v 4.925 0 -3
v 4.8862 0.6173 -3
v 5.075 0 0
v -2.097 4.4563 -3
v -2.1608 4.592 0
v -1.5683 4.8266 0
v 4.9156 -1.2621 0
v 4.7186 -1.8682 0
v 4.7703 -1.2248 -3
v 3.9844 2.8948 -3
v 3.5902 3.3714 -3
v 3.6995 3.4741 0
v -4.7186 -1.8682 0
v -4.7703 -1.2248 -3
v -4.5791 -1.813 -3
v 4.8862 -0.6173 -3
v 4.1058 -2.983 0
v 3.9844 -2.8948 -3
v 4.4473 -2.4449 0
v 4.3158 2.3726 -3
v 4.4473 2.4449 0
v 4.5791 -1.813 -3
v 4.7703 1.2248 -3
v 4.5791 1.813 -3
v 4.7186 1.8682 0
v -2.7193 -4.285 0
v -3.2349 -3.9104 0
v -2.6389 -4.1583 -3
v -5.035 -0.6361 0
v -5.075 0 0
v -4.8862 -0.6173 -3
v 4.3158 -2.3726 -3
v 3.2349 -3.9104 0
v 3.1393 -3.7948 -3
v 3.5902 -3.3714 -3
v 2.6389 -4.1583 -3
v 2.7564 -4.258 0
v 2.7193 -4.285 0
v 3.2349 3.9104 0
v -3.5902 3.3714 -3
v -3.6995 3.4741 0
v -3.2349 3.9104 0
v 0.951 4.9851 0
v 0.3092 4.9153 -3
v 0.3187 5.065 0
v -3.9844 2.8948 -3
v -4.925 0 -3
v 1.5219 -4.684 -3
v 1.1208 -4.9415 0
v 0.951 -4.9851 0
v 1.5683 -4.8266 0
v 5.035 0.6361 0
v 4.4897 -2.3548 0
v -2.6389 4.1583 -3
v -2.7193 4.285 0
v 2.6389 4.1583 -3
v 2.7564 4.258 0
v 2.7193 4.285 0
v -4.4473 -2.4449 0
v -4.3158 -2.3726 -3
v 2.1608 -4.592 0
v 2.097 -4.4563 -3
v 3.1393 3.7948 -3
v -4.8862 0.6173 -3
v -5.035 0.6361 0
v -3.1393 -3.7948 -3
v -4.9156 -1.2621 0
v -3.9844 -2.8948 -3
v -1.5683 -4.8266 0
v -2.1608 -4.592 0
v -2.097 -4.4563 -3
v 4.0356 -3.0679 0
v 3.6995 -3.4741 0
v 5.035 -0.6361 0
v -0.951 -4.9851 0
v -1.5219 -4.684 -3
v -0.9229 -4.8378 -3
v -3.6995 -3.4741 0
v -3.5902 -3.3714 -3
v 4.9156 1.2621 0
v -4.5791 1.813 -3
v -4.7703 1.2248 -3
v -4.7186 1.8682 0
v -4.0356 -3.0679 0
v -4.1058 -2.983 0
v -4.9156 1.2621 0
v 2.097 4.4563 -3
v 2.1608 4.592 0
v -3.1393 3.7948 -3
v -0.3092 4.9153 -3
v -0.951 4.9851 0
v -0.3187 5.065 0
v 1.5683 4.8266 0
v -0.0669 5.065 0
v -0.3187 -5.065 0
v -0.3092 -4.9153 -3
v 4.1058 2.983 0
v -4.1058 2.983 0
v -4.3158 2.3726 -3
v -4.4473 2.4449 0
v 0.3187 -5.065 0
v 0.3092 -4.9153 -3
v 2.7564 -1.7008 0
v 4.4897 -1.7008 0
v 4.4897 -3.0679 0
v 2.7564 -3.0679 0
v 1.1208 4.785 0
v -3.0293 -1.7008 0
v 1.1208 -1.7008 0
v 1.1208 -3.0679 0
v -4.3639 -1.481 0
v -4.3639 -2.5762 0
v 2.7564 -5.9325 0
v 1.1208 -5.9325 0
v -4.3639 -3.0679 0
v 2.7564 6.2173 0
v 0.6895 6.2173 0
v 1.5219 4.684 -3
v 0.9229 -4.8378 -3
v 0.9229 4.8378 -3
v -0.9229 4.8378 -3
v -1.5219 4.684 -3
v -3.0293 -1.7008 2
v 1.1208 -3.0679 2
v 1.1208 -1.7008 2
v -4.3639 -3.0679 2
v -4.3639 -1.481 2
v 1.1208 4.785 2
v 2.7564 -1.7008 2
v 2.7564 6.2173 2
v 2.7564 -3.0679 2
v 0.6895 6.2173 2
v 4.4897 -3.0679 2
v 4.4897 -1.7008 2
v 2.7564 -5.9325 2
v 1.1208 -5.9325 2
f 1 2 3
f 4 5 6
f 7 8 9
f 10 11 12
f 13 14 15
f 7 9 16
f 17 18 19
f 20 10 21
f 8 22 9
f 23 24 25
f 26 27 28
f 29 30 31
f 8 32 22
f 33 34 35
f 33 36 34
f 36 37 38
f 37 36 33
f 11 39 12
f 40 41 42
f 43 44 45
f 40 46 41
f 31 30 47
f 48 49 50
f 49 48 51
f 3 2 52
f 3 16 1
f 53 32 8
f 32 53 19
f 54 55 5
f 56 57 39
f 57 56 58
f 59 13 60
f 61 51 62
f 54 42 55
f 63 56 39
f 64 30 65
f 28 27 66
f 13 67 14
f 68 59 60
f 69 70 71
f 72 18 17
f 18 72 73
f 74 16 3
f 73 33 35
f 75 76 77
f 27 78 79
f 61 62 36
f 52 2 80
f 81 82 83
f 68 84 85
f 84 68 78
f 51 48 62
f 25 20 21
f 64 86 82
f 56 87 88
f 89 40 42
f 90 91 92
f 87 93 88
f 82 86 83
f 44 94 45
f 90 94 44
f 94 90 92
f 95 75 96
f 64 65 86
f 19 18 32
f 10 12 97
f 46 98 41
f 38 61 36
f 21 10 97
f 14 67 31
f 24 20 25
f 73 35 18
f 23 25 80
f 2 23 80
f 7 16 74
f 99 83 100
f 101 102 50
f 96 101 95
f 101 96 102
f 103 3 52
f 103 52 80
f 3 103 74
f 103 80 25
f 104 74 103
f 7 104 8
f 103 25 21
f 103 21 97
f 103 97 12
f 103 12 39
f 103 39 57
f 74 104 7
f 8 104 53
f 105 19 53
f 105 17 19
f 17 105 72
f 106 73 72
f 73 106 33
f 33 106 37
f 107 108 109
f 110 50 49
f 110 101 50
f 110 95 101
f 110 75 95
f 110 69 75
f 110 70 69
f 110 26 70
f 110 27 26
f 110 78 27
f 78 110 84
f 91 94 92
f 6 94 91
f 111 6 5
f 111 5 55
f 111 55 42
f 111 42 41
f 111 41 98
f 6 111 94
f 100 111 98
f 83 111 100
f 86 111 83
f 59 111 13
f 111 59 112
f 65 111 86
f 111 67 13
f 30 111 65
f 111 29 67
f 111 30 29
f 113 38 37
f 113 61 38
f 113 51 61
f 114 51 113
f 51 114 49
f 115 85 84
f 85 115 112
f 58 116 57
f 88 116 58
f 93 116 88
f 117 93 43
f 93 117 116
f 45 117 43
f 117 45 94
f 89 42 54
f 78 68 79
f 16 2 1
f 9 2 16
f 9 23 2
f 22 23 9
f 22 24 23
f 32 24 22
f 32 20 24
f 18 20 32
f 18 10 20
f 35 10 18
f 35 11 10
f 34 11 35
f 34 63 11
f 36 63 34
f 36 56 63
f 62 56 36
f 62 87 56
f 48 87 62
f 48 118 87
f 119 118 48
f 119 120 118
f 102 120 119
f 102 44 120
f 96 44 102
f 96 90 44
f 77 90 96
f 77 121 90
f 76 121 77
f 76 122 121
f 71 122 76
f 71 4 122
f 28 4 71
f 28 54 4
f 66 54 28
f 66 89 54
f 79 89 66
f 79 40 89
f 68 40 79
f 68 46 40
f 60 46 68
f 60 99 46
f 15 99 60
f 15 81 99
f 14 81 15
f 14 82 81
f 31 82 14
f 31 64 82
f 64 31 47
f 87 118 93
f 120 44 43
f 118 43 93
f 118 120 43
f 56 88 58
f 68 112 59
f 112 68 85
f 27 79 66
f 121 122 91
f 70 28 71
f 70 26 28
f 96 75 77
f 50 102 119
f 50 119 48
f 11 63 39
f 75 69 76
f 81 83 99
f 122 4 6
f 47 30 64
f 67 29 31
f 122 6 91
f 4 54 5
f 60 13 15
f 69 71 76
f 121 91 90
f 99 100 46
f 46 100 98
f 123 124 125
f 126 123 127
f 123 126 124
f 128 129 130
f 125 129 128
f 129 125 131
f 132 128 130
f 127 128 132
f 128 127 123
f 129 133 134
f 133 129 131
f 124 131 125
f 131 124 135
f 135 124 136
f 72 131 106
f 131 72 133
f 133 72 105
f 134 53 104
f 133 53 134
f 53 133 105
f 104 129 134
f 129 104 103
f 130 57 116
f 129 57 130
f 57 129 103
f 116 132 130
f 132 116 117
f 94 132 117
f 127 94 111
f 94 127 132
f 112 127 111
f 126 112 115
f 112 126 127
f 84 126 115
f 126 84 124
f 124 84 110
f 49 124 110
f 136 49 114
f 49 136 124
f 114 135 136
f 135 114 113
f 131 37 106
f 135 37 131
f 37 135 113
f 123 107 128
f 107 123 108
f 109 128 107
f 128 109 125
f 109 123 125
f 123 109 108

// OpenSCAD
$fn = 50;


difference() {
	union() {
		translate(v = [0, 0, -3.0000000000]) {
			cylinder(h = 3, r1 = 4.9250000000, r2 = 5.0750000000);
		}
		linear_extrude(height = 2) {
			text(font = "Impact", halign = "center", size = 12, text = "4", valign = "center");
		}
	}
	union();
}
